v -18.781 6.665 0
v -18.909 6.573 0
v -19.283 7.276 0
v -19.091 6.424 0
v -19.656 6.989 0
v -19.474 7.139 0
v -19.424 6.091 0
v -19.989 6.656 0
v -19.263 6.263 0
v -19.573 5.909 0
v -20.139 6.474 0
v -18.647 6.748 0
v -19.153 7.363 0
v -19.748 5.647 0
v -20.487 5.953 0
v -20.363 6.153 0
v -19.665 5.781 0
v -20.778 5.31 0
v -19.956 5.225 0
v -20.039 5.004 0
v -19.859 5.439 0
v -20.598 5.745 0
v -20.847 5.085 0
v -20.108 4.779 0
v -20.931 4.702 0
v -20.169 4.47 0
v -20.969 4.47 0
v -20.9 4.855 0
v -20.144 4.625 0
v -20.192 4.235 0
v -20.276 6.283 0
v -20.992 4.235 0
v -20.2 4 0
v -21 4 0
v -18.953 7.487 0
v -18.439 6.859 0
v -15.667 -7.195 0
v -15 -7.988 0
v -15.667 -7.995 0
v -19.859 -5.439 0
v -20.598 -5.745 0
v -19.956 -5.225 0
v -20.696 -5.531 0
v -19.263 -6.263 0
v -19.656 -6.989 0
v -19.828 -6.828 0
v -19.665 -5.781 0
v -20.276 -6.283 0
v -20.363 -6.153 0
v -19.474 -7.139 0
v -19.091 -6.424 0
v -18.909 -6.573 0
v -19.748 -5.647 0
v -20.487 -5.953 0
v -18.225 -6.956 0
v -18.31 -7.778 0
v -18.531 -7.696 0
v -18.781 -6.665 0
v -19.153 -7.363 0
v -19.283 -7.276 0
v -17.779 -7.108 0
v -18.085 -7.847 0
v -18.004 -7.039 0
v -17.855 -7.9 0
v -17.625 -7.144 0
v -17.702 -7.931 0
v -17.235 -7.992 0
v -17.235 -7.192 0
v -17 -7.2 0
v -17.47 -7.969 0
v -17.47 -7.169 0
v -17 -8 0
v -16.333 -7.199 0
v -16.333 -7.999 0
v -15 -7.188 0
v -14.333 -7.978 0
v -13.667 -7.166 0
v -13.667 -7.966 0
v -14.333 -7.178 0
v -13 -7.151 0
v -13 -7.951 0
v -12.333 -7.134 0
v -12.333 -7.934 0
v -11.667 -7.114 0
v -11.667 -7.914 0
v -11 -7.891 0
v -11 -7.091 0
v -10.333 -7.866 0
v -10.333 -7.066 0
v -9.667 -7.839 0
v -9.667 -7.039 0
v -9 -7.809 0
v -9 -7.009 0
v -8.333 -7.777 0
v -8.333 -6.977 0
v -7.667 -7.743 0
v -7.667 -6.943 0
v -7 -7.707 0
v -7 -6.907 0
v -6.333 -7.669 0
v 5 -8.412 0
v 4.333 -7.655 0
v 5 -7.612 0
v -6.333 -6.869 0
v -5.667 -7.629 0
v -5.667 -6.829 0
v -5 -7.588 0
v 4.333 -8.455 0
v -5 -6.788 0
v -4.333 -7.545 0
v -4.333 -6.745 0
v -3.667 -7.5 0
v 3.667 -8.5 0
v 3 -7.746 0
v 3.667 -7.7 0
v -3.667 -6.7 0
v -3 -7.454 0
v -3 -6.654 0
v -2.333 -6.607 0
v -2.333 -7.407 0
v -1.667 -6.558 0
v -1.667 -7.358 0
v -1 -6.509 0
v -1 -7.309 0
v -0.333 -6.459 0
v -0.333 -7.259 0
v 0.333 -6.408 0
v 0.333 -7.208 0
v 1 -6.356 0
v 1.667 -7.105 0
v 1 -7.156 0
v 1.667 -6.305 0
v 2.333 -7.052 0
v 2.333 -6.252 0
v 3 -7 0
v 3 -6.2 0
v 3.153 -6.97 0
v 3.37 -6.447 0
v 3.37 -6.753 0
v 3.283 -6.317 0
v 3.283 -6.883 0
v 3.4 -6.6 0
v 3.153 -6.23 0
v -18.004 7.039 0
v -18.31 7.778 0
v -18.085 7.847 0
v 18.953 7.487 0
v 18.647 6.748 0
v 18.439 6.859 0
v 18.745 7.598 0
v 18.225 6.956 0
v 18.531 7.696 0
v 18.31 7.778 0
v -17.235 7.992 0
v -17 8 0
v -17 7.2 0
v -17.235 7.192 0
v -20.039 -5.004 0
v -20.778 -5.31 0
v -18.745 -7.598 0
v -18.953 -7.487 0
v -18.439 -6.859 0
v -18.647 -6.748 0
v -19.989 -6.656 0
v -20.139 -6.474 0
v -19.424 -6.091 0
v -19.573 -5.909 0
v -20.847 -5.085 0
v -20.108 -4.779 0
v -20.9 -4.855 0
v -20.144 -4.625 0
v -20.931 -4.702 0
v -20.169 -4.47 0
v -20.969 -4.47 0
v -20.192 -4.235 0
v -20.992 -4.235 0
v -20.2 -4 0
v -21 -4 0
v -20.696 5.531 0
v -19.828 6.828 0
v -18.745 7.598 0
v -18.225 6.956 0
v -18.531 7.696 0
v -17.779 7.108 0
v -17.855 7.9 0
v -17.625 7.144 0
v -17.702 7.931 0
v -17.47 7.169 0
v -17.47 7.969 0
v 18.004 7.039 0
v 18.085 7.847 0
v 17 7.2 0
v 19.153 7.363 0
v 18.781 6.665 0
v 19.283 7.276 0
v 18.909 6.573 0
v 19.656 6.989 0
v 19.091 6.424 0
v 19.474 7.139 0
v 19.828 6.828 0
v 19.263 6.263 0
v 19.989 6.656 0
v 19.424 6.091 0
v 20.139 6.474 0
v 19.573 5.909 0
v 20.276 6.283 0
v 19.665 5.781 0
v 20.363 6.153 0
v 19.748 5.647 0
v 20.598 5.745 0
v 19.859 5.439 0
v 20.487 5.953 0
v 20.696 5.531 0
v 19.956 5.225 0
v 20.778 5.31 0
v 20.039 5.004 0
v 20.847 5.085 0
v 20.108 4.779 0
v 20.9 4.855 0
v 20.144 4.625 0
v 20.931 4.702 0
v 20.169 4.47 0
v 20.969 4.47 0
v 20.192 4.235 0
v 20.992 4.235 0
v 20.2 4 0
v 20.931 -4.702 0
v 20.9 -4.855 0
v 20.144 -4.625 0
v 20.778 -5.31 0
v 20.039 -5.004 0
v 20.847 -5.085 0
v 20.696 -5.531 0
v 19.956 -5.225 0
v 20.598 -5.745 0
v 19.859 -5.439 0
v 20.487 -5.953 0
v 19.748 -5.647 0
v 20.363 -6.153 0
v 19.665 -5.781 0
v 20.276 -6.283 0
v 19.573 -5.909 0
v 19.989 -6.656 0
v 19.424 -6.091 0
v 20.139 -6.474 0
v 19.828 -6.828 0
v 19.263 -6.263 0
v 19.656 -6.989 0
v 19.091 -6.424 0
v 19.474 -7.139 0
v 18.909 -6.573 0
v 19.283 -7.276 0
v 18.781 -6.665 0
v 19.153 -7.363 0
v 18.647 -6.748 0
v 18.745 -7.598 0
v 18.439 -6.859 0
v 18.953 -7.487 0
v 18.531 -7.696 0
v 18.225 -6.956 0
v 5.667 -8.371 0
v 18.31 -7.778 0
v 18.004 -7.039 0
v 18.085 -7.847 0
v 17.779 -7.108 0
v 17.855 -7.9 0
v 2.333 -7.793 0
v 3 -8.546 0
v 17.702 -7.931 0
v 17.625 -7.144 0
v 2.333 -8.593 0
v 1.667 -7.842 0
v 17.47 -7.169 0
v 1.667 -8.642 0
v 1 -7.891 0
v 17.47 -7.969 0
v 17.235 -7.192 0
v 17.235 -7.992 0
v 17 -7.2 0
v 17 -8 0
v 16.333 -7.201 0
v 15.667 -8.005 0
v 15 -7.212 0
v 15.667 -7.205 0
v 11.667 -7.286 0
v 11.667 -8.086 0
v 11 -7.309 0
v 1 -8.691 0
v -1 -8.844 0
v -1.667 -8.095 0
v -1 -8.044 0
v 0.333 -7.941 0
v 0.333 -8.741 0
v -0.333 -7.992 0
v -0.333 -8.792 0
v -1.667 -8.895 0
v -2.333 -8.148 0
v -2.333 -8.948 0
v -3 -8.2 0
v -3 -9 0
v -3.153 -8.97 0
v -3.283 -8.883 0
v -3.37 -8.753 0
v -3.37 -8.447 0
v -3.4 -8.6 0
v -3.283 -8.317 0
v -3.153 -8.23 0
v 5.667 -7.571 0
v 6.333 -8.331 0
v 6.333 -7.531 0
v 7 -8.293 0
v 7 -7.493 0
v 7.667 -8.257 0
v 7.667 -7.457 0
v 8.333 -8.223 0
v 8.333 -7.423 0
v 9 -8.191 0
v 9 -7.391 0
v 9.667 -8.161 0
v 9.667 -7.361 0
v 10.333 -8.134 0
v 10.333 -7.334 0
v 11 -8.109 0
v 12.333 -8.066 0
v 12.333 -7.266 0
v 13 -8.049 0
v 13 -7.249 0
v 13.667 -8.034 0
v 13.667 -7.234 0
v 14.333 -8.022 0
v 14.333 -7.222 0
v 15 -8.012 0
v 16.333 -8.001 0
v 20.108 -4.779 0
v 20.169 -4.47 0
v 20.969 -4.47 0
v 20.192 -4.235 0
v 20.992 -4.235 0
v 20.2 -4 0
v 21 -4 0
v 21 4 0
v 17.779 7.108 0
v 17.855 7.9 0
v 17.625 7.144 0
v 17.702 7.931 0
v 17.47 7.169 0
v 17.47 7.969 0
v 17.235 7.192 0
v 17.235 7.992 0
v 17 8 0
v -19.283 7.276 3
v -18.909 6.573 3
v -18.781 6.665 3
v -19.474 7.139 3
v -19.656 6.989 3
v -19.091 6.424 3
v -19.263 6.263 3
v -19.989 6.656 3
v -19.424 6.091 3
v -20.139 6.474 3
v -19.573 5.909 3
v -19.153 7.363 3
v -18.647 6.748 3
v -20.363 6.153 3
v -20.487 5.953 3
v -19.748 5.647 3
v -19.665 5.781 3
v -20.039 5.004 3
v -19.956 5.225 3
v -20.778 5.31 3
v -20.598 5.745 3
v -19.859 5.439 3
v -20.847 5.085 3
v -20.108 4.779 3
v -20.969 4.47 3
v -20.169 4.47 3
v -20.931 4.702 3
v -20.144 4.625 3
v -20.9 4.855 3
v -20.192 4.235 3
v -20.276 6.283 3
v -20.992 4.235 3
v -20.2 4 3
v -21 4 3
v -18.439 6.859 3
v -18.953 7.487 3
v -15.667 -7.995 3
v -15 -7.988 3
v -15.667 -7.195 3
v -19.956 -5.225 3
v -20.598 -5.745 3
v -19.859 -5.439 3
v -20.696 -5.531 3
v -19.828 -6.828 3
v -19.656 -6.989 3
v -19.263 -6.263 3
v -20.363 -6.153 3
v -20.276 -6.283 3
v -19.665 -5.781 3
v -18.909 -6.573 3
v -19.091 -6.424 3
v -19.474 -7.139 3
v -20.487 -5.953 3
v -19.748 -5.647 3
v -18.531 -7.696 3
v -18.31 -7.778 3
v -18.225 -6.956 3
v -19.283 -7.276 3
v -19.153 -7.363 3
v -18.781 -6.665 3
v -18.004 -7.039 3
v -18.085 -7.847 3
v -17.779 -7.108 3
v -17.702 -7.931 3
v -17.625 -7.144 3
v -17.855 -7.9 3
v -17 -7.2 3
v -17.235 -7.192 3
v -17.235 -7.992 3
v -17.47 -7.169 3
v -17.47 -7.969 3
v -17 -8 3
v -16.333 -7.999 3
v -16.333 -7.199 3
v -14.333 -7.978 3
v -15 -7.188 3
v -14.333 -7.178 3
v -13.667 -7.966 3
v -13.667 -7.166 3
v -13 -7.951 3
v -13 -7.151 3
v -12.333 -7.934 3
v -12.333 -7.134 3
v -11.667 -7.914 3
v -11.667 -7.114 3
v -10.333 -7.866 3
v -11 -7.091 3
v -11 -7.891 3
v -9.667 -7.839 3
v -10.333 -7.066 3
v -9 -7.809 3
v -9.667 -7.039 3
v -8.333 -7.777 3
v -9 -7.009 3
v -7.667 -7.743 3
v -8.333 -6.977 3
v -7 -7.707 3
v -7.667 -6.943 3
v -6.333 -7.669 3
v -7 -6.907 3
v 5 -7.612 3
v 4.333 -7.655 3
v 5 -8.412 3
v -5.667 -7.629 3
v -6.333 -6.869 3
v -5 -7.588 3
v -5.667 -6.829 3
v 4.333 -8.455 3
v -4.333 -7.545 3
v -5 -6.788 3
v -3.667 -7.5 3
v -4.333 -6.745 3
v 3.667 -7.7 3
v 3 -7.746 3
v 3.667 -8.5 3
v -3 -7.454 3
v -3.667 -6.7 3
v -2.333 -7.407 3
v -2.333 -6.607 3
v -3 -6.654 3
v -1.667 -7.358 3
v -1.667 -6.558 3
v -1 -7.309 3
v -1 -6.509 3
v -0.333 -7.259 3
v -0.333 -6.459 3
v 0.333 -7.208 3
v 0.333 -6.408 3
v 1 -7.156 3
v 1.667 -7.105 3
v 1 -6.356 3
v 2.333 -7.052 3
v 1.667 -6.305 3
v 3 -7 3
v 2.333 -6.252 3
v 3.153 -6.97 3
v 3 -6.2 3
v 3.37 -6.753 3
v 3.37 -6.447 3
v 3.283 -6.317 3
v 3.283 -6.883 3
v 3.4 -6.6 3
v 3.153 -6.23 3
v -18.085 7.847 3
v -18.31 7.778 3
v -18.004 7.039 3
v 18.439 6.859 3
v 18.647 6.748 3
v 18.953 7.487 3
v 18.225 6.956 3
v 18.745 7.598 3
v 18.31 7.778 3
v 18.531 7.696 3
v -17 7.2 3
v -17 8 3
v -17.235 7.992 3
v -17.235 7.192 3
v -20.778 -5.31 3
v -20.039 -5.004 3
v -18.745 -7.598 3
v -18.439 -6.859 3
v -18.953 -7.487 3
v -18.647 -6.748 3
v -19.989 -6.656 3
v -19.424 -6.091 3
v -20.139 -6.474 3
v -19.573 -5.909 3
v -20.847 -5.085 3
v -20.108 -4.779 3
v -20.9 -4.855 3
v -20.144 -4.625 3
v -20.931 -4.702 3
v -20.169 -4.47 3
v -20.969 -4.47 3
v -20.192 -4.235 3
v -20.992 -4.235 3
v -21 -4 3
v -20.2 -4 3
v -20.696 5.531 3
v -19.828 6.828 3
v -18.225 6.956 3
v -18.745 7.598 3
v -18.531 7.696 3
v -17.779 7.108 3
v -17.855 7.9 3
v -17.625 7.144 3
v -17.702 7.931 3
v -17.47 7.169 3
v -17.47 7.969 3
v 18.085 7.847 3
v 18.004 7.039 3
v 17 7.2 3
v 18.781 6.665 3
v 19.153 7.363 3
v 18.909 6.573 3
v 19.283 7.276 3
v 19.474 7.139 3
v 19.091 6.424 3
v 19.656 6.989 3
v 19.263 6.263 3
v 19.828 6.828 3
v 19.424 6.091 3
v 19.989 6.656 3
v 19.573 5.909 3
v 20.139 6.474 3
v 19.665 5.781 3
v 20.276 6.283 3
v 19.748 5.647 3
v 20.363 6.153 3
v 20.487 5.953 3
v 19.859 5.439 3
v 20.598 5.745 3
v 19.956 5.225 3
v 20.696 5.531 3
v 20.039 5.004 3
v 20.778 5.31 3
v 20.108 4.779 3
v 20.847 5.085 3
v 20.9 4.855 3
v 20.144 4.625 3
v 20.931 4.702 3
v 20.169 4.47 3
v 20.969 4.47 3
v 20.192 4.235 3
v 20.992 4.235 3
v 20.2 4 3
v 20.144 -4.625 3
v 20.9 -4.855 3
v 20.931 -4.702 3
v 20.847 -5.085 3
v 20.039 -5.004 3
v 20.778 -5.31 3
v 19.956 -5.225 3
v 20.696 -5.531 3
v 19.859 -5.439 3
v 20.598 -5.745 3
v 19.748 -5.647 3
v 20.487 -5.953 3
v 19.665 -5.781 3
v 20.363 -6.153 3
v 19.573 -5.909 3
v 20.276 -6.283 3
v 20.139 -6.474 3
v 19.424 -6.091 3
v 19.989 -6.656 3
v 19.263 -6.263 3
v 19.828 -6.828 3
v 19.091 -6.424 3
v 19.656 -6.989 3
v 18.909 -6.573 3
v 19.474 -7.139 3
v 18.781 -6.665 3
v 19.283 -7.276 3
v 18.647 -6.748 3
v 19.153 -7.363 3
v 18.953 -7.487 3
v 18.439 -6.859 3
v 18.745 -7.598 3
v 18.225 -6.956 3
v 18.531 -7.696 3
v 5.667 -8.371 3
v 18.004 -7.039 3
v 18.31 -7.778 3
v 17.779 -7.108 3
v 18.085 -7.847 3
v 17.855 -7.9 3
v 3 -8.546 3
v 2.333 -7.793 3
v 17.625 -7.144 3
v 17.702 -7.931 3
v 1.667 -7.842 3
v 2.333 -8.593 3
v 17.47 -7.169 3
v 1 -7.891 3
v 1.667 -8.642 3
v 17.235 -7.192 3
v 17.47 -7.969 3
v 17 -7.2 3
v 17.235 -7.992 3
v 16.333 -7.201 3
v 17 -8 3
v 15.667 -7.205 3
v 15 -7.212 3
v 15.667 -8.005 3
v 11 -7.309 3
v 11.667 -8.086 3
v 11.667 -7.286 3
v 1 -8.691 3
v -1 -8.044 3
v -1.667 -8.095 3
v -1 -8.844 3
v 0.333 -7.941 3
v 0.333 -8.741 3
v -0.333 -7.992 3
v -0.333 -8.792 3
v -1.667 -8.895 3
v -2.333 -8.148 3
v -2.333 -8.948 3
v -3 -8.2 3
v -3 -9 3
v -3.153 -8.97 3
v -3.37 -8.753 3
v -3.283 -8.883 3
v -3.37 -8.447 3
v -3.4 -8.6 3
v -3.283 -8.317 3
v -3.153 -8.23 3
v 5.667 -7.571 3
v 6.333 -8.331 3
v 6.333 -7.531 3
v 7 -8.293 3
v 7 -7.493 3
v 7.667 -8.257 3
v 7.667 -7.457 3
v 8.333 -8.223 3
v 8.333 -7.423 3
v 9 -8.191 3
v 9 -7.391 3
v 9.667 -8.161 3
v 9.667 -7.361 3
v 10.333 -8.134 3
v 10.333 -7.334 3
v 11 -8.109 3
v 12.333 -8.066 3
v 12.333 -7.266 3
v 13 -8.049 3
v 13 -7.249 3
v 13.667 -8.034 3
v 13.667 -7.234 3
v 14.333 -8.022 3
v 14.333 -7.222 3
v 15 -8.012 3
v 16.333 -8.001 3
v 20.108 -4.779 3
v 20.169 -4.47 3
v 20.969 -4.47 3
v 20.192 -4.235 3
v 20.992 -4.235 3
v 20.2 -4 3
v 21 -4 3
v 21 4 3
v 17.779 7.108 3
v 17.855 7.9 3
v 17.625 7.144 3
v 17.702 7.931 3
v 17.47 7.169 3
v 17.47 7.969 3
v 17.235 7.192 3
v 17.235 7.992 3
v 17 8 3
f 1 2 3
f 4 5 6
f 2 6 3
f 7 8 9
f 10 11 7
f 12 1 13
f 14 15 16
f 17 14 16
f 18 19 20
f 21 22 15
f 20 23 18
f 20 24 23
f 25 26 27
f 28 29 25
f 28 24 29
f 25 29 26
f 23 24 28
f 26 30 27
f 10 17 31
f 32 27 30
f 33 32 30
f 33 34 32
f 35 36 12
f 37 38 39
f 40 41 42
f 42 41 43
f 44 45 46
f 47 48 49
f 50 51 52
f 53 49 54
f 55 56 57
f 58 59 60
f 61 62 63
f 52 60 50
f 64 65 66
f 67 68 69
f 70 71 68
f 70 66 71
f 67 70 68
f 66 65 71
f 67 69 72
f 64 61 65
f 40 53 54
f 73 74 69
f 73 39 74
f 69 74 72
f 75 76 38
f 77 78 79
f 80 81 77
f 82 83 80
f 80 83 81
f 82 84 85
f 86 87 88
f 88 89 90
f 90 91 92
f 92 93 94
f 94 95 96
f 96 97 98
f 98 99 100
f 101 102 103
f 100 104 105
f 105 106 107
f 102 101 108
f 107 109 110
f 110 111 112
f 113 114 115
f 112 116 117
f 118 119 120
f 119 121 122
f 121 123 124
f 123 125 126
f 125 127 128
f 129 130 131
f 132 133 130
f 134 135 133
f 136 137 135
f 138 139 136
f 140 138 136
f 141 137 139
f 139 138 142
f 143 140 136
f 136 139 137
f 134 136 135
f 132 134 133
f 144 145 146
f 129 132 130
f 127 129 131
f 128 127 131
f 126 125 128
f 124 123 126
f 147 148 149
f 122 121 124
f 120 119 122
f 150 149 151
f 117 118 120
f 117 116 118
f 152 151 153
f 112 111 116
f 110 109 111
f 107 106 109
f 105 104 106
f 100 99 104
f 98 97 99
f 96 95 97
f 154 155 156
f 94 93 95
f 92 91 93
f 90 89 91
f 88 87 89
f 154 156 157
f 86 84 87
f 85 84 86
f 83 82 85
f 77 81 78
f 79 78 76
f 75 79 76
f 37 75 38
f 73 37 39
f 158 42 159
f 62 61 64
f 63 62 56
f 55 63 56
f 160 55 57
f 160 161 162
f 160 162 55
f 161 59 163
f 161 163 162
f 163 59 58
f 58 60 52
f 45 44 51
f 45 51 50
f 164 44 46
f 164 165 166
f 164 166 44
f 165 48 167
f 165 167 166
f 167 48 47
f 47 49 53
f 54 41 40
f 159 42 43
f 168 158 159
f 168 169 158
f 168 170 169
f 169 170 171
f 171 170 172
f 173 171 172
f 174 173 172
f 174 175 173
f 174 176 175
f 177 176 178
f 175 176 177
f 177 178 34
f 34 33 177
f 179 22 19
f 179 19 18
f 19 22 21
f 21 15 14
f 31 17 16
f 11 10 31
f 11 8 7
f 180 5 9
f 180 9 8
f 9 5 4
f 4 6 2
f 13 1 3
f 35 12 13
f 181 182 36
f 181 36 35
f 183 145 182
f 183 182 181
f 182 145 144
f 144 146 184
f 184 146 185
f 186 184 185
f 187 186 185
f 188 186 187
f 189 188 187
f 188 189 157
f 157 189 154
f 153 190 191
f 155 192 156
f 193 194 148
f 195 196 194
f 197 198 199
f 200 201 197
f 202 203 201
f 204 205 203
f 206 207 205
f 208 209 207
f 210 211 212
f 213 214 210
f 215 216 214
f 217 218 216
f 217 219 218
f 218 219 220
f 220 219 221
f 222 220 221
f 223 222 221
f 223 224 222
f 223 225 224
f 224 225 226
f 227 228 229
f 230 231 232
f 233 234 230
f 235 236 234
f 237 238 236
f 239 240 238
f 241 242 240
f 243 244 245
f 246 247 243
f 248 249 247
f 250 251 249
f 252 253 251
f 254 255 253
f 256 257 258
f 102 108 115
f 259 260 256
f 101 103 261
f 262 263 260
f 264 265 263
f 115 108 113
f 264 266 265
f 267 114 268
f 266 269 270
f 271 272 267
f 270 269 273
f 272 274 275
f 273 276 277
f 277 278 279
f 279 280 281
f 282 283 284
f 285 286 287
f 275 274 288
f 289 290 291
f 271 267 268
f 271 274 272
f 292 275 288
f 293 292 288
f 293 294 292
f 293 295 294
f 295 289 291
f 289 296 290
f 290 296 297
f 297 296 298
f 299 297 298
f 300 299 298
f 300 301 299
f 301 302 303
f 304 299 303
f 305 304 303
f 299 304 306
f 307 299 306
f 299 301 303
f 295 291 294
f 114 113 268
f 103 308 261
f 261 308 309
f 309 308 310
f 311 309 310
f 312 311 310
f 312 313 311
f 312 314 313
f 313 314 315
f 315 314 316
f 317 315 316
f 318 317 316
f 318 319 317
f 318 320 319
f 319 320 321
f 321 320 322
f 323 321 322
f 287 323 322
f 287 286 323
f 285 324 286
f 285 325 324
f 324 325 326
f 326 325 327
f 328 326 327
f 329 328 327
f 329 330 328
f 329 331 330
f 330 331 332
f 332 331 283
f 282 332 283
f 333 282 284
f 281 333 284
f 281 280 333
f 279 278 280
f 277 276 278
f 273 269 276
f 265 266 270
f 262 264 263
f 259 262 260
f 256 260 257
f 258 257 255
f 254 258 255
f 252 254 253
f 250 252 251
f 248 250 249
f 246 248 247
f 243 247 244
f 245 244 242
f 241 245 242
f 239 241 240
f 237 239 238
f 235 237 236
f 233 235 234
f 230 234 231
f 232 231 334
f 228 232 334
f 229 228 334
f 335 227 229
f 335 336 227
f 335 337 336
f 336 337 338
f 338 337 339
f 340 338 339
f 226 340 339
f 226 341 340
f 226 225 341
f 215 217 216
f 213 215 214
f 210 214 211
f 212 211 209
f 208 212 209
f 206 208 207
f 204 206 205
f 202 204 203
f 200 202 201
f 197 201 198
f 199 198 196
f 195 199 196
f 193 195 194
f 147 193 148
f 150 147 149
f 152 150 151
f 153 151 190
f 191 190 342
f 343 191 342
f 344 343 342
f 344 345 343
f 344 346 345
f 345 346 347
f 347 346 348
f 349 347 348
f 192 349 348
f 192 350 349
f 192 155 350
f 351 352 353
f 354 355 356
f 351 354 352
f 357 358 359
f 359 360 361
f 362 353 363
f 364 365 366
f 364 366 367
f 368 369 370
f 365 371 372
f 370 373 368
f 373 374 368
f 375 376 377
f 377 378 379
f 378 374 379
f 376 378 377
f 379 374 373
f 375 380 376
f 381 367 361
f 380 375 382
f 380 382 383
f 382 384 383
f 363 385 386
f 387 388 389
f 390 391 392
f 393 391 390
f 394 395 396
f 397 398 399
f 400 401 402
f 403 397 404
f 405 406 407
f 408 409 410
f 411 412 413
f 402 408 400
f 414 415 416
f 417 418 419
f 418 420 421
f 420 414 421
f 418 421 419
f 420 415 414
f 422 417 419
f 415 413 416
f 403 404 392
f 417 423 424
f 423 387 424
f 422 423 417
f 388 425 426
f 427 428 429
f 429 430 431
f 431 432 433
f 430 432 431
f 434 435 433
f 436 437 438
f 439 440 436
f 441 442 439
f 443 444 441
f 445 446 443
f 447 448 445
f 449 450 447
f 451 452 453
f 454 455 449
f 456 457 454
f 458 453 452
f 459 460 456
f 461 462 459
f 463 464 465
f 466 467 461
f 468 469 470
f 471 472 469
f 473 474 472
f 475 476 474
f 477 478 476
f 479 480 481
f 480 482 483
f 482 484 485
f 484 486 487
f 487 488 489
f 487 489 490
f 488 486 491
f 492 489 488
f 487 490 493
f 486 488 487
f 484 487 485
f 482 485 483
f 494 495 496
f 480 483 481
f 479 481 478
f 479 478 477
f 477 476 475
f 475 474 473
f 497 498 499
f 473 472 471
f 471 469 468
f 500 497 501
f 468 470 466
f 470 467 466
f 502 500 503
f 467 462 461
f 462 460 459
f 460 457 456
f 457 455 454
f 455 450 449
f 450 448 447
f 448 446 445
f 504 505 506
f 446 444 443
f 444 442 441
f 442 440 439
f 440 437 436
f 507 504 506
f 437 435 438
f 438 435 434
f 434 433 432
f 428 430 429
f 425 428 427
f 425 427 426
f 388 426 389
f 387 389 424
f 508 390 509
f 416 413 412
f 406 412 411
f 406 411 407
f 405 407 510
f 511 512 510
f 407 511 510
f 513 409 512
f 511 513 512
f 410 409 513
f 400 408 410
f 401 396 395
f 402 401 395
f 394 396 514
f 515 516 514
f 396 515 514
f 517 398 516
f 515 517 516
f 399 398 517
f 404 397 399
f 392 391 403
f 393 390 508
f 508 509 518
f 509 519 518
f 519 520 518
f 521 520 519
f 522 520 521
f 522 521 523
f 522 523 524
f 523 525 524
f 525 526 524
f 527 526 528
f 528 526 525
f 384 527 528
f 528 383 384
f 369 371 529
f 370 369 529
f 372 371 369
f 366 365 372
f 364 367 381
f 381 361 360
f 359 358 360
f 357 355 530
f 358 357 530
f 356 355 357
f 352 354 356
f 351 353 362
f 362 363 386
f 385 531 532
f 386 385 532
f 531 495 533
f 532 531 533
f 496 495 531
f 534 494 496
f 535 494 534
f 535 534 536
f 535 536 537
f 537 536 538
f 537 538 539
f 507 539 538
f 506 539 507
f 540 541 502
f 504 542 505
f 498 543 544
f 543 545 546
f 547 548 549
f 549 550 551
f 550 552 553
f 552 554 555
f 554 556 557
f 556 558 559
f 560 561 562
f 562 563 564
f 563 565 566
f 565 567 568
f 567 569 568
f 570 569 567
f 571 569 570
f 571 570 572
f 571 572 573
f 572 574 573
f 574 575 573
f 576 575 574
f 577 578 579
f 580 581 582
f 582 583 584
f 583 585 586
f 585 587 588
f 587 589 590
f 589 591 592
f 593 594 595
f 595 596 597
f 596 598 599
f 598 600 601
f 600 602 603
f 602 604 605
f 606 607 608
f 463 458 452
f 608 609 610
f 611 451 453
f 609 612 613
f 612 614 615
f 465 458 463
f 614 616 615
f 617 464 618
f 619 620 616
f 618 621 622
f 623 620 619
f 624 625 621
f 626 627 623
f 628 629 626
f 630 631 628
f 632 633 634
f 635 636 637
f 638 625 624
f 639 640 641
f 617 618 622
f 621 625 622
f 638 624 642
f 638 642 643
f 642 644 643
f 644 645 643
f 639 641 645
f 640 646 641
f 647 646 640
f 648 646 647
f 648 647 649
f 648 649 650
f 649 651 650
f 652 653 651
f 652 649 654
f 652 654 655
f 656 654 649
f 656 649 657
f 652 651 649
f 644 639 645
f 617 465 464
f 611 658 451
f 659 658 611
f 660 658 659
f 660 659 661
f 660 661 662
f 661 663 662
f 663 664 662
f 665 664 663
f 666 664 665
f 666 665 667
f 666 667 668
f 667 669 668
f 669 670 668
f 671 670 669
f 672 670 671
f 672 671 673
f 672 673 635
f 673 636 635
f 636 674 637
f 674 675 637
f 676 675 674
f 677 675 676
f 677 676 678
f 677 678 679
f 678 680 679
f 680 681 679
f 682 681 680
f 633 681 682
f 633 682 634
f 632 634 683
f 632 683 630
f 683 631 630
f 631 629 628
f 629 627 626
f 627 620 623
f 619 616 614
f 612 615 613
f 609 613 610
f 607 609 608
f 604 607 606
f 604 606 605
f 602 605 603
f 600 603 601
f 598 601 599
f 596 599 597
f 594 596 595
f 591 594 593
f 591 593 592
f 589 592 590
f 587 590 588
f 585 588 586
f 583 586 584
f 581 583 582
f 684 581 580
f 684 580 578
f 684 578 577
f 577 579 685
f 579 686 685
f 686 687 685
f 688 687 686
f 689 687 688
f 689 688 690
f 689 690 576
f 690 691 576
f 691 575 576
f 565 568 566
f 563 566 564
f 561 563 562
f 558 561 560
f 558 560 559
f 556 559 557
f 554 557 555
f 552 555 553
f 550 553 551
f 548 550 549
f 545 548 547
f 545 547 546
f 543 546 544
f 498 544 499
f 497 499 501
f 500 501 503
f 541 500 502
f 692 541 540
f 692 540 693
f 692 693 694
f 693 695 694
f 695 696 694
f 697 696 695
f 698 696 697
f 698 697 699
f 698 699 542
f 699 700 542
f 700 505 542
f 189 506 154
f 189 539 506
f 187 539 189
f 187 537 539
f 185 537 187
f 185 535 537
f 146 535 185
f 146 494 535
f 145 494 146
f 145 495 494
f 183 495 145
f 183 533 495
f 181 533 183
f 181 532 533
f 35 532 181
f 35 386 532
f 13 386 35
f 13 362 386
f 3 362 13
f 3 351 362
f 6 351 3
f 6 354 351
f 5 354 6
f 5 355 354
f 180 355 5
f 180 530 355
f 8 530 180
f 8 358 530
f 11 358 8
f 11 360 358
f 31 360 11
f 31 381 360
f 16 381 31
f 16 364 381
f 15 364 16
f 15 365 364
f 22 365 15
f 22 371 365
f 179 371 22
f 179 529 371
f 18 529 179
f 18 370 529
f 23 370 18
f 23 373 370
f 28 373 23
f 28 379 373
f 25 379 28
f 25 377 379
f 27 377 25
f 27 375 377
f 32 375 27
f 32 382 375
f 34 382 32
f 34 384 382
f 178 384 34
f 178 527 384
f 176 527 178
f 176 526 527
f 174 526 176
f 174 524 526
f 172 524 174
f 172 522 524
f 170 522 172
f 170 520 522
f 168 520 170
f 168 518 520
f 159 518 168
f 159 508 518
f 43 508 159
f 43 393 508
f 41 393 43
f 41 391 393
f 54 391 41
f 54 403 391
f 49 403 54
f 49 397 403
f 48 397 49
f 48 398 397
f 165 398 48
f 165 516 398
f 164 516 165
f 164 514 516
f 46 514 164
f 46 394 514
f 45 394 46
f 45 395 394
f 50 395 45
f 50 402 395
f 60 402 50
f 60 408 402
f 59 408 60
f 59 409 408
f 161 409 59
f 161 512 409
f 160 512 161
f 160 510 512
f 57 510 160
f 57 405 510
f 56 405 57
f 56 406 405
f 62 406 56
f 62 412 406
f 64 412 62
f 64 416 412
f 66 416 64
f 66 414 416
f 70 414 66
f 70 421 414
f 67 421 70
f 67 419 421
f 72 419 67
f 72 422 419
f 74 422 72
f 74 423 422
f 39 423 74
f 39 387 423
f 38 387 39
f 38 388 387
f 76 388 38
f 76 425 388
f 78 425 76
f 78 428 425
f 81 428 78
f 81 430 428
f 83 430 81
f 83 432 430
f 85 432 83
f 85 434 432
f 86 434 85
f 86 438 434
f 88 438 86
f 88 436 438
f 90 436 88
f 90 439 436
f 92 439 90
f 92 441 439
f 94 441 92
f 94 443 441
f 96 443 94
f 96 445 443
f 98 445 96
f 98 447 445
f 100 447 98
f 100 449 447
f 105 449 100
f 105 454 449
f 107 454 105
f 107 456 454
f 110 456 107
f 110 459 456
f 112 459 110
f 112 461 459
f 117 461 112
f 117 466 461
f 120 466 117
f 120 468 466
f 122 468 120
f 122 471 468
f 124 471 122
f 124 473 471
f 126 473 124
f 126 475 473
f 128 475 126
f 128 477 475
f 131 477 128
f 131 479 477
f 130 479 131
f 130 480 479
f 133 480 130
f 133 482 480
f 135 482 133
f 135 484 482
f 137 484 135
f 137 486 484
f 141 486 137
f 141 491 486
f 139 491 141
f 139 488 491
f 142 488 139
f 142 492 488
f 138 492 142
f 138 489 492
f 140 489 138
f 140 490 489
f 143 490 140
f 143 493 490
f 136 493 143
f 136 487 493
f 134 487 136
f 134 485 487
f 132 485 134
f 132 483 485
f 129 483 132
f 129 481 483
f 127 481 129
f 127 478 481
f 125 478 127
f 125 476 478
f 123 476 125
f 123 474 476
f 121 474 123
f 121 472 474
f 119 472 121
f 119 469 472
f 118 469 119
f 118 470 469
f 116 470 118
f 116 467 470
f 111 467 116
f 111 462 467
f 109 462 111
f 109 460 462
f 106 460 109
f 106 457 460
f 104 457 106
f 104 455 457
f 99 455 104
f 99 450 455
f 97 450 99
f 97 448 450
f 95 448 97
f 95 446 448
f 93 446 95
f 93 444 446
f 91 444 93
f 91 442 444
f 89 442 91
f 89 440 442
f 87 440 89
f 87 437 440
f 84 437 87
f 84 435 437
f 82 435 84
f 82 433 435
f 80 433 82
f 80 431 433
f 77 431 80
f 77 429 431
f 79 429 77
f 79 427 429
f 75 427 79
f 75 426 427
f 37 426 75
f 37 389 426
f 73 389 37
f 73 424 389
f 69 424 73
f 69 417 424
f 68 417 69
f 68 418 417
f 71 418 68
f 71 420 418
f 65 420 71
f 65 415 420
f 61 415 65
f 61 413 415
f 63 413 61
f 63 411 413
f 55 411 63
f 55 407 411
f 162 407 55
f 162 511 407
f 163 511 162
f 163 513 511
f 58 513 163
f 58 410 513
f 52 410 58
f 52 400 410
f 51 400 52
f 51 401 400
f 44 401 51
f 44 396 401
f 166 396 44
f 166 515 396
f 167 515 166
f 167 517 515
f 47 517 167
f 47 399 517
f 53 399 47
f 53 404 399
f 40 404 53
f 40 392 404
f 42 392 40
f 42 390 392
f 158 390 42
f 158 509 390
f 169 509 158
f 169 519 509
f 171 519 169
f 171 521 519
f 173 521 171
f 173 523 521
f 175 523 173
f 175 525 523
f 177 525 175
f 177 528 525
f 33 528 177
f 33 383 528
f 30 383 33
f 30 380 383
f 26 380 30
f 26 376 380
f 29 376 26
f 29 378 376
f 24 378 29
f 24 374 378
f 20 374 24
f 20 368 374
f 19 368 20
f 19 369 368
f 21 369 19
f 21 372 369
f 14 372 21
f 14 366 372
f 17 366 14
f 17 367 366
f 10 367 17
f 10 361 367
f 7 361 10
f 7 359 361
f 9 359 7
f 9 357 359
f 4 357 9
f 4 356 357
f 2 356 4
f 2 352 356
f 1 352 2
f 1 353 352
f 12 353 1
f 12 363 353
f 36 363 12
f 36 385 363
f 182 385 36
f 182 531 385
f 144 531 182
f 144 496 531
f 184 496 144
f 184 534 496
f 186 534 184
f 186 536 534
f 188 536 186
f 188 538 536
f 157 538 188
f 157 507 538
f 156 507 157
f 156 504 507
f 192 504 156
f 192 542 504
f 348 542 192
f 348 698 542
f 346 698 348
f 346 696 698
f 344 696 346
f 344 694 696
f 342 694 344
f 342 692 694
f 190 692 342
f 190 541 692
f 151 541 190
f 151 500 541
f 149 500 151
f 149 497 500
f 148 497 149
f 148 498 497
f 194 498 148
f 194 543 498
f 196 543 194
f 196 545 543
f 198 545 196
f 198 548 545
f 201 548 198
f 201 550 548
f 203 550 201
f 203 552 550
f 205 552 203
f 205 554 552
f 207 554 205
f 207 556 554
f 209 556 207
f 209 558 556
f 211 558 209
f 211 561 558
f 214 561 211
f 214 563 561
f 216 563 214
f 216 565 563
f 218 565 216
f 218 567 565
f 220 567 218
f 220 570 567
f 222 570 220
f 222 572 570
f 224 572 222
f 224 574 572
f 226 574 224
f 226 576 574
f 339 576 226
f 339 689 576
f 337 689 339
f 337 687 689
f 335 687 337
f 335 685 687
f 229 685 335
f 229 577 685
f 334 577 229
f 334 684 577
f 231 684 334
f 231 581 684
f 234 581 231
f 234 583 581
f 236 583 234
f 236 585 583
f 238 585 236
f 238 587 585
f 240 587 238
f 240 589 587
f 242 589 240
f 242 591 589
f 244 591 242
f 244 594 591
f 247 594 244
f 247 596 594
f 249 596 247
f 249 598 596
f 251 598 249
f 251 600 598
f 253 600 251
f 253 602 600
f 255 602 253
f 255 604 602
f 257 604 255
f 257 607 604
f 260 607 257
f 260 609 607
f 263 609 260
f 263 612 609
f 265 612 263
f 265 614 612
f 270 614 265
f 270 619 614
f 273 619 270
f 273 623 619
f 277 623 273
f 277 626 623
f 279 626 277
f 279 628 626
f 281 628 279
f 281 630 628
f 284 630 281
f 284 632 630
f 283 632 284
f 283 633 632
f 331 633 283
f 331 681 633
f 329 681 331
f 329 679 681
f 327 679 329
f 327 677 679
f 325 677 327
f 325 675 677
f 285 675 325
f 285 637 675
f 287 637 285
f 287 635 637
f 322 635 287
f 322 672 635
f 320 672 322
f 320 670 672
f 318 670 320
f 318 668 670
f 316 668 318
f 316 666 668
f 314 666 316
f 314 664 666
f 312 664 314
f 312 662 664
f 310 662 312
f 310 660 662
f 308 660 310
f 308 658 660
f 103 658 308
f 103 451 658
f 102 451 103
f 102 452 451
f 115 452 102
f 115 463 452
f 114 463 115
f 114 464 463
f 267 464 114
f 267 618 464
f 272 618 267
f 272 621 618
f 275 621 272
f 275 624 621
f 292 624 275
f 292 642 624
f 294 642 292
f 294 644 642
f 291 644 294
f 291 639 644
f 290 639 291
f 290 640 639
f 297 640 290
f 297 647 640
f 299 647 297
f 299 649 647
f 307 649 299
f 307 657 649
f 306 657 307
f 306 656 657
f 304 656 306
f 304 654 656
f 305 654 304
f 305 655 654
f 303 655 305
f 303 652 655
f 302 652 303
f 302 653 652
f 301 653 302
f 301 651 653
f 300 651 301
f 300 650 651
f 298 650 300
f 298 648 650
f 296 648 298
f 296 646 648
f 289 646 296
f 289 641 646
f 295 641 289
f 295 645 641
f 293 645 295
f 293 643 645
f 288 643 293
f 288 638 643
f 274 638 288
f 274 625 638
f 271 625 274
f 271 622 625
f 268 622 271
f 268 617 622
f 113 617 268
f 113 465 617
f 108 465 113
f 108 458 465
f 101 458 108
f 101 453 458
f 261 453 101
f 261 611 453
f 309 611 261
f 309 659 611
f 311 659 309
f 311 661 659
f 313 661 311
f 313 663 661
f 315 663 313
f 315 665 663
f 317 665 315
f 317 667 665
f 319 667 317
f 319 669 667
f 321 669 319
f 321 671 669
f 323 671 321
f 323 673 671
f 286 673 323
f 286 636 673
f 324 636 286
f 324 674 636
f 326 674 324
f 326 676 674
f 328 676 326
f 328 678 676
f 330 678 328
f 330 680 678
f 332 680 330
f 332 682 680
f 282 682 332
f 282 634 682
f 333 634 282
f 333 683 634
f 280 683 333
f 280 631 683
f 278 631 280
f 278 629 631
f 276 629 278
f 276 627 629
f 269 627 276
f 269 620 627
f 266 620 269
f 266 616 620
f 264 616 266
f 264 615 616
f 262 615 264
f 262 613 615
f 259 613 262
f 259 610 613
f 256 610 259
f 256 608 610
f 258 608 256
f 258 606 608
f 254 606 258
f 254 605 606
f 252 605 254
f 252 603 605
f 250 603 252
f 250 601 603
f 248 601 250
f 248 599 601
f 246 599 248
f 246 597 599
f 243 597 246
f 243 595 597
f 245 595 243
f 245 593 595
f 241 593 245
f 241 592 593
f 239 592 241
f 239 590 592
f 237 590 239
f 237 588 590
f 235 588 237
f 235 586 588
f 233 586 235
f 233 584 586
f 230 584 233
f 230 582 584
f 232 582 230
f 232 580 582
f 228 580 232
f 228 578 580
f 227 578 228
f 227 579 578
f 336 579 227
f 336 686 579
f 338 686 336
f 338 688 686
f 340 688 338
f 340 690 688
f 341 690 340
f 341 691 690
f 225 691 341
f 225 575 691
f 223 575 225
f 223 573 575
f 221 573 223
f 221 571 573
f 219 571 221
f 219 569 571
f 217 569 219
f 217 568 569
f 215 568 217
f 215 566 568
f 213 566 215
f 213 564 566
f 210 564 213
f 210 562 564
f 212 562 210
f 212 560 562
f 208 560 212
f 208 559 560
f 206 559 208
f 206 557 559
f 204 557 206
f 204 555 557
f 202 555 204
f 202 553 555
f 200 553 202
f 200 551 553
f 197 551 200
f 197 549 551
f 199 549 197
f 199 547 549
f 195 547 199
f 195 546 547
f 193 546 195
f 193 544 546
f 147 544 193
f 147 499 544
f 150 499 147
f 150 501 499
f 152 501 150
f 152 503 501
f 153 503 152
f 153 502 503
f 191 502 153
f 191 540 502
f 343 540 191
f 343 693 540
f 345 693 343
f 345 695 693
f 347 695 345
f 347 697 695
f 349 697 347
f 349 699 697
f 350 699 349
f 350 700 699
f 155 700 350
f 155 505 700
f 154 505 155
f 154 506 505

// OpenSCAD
/* 
  Rounded Open Wall
  Outer Dimensions: 42x16mm, 3mm high, 0.8mm thick.
  One half of the long wall bends outward, the other half bends inward.
*/

// --- Parameters ---
length = 42;
width = 16;
height = 3;
thickness = 0.8;

// How far the bent halves push outward/inward (in mm)
bend_amount = 1; 

// How much the bent and unbent walls overlap each other horizontally (in mm)
// Use a negative number to create a gap instead!
overlap = 6;

// 8mm radius makes it a perfect capsule (half-circle ends) for a 16mm width.
// Decrease this if you want a more rectangular box with rounded corners.
corner_radius = 4; 


// --- Internal Calculations ---
// Calculate the centerline path coordinates
L_mid = length - thickness;
W_mid = width - thickness;
R = corner_radius - thickness/2;
cx = L_mid/2 - R;
cy = W_mid/2 - R;

// Helper function to generate corner arcs
function arc(x, y, r, a1, a2, steps=24) = 
    [for (i=[0:steps]) 
        [x + r*cos(a1 + (a2-a1)*i/steps), y + r*sin(a1 + (a2-a1)*i/steps)]
    ];

// Define the continuous path of the wall
wall_path = concat(
    // 1. Left half of the bottom wall (Bends INWARD)
    [for (i=[0:29]) 
        // t goes from 1 (at the overlapping tip) down to >0 (near the corner)
        let(t = 1 - i/30)           
        
        // x moves leftwards from overlap/2, ending just before -cx
        let(px = -cx + (cx + overlap/2)*t)     
        
        // Uses +bend_amount to push the wall inward towards the center
        let(py = -W_mid/2 + bend_amount*(1-cos(t*90))) 
        [px, py]
    ],
    
    // 2. Bottom-left corner (starts exactly where the inward bend finishes)
    arc(-cx, -cy, R, 270, 180),
    
    // 3. Top-left corner (implicitly connects and draws the left wall)
    arc(-cx, cy, R, 180, 90),
    
    // 4. Top-right corner (implicitly connects and draws the top wall)
    arc(cx, cy, R, 90, 0),
    
    // 5. Bottom-right corner (implicitly connects and draws the right wall)
    arc(cx, -cy, R, 360, 270),
    
    // 6. Right half of the bottom wall (Bends OUTWARD)
    [for (i=[1:30]) 
        let(t = i/30)           // t goes from >0 to 1
        
        // x moves leftwards from the corner, passing 0, and ending at -overlap/2
        let(px = cx - (cx + overlap/2)*t)     
        
        // Uses -bend_amount to push the wall outward away from the center
        let(py = -W_mid/2 - bend_amount*(1-cos(t*90))) 
        [px, py]
    ]
);

// --- Modules ---

// Module to trace a 2D path array with a specific thickness
module polyline(pts, th) {
    for(i=[0:len(pts)-2]) {
        hull() {
            translate(pts[i]) circle(d=th, $fn=16);
            translate(pts[i+1]) circle(d=th, $fn=16);
        }
    }
}

// --- 3D Generation ---
// Extrude the 2D outline to the specified height
$fn = 32; // Overall smoothness
linear_extrude(height=height) {
    polyline(wall_path, thickness);
}
